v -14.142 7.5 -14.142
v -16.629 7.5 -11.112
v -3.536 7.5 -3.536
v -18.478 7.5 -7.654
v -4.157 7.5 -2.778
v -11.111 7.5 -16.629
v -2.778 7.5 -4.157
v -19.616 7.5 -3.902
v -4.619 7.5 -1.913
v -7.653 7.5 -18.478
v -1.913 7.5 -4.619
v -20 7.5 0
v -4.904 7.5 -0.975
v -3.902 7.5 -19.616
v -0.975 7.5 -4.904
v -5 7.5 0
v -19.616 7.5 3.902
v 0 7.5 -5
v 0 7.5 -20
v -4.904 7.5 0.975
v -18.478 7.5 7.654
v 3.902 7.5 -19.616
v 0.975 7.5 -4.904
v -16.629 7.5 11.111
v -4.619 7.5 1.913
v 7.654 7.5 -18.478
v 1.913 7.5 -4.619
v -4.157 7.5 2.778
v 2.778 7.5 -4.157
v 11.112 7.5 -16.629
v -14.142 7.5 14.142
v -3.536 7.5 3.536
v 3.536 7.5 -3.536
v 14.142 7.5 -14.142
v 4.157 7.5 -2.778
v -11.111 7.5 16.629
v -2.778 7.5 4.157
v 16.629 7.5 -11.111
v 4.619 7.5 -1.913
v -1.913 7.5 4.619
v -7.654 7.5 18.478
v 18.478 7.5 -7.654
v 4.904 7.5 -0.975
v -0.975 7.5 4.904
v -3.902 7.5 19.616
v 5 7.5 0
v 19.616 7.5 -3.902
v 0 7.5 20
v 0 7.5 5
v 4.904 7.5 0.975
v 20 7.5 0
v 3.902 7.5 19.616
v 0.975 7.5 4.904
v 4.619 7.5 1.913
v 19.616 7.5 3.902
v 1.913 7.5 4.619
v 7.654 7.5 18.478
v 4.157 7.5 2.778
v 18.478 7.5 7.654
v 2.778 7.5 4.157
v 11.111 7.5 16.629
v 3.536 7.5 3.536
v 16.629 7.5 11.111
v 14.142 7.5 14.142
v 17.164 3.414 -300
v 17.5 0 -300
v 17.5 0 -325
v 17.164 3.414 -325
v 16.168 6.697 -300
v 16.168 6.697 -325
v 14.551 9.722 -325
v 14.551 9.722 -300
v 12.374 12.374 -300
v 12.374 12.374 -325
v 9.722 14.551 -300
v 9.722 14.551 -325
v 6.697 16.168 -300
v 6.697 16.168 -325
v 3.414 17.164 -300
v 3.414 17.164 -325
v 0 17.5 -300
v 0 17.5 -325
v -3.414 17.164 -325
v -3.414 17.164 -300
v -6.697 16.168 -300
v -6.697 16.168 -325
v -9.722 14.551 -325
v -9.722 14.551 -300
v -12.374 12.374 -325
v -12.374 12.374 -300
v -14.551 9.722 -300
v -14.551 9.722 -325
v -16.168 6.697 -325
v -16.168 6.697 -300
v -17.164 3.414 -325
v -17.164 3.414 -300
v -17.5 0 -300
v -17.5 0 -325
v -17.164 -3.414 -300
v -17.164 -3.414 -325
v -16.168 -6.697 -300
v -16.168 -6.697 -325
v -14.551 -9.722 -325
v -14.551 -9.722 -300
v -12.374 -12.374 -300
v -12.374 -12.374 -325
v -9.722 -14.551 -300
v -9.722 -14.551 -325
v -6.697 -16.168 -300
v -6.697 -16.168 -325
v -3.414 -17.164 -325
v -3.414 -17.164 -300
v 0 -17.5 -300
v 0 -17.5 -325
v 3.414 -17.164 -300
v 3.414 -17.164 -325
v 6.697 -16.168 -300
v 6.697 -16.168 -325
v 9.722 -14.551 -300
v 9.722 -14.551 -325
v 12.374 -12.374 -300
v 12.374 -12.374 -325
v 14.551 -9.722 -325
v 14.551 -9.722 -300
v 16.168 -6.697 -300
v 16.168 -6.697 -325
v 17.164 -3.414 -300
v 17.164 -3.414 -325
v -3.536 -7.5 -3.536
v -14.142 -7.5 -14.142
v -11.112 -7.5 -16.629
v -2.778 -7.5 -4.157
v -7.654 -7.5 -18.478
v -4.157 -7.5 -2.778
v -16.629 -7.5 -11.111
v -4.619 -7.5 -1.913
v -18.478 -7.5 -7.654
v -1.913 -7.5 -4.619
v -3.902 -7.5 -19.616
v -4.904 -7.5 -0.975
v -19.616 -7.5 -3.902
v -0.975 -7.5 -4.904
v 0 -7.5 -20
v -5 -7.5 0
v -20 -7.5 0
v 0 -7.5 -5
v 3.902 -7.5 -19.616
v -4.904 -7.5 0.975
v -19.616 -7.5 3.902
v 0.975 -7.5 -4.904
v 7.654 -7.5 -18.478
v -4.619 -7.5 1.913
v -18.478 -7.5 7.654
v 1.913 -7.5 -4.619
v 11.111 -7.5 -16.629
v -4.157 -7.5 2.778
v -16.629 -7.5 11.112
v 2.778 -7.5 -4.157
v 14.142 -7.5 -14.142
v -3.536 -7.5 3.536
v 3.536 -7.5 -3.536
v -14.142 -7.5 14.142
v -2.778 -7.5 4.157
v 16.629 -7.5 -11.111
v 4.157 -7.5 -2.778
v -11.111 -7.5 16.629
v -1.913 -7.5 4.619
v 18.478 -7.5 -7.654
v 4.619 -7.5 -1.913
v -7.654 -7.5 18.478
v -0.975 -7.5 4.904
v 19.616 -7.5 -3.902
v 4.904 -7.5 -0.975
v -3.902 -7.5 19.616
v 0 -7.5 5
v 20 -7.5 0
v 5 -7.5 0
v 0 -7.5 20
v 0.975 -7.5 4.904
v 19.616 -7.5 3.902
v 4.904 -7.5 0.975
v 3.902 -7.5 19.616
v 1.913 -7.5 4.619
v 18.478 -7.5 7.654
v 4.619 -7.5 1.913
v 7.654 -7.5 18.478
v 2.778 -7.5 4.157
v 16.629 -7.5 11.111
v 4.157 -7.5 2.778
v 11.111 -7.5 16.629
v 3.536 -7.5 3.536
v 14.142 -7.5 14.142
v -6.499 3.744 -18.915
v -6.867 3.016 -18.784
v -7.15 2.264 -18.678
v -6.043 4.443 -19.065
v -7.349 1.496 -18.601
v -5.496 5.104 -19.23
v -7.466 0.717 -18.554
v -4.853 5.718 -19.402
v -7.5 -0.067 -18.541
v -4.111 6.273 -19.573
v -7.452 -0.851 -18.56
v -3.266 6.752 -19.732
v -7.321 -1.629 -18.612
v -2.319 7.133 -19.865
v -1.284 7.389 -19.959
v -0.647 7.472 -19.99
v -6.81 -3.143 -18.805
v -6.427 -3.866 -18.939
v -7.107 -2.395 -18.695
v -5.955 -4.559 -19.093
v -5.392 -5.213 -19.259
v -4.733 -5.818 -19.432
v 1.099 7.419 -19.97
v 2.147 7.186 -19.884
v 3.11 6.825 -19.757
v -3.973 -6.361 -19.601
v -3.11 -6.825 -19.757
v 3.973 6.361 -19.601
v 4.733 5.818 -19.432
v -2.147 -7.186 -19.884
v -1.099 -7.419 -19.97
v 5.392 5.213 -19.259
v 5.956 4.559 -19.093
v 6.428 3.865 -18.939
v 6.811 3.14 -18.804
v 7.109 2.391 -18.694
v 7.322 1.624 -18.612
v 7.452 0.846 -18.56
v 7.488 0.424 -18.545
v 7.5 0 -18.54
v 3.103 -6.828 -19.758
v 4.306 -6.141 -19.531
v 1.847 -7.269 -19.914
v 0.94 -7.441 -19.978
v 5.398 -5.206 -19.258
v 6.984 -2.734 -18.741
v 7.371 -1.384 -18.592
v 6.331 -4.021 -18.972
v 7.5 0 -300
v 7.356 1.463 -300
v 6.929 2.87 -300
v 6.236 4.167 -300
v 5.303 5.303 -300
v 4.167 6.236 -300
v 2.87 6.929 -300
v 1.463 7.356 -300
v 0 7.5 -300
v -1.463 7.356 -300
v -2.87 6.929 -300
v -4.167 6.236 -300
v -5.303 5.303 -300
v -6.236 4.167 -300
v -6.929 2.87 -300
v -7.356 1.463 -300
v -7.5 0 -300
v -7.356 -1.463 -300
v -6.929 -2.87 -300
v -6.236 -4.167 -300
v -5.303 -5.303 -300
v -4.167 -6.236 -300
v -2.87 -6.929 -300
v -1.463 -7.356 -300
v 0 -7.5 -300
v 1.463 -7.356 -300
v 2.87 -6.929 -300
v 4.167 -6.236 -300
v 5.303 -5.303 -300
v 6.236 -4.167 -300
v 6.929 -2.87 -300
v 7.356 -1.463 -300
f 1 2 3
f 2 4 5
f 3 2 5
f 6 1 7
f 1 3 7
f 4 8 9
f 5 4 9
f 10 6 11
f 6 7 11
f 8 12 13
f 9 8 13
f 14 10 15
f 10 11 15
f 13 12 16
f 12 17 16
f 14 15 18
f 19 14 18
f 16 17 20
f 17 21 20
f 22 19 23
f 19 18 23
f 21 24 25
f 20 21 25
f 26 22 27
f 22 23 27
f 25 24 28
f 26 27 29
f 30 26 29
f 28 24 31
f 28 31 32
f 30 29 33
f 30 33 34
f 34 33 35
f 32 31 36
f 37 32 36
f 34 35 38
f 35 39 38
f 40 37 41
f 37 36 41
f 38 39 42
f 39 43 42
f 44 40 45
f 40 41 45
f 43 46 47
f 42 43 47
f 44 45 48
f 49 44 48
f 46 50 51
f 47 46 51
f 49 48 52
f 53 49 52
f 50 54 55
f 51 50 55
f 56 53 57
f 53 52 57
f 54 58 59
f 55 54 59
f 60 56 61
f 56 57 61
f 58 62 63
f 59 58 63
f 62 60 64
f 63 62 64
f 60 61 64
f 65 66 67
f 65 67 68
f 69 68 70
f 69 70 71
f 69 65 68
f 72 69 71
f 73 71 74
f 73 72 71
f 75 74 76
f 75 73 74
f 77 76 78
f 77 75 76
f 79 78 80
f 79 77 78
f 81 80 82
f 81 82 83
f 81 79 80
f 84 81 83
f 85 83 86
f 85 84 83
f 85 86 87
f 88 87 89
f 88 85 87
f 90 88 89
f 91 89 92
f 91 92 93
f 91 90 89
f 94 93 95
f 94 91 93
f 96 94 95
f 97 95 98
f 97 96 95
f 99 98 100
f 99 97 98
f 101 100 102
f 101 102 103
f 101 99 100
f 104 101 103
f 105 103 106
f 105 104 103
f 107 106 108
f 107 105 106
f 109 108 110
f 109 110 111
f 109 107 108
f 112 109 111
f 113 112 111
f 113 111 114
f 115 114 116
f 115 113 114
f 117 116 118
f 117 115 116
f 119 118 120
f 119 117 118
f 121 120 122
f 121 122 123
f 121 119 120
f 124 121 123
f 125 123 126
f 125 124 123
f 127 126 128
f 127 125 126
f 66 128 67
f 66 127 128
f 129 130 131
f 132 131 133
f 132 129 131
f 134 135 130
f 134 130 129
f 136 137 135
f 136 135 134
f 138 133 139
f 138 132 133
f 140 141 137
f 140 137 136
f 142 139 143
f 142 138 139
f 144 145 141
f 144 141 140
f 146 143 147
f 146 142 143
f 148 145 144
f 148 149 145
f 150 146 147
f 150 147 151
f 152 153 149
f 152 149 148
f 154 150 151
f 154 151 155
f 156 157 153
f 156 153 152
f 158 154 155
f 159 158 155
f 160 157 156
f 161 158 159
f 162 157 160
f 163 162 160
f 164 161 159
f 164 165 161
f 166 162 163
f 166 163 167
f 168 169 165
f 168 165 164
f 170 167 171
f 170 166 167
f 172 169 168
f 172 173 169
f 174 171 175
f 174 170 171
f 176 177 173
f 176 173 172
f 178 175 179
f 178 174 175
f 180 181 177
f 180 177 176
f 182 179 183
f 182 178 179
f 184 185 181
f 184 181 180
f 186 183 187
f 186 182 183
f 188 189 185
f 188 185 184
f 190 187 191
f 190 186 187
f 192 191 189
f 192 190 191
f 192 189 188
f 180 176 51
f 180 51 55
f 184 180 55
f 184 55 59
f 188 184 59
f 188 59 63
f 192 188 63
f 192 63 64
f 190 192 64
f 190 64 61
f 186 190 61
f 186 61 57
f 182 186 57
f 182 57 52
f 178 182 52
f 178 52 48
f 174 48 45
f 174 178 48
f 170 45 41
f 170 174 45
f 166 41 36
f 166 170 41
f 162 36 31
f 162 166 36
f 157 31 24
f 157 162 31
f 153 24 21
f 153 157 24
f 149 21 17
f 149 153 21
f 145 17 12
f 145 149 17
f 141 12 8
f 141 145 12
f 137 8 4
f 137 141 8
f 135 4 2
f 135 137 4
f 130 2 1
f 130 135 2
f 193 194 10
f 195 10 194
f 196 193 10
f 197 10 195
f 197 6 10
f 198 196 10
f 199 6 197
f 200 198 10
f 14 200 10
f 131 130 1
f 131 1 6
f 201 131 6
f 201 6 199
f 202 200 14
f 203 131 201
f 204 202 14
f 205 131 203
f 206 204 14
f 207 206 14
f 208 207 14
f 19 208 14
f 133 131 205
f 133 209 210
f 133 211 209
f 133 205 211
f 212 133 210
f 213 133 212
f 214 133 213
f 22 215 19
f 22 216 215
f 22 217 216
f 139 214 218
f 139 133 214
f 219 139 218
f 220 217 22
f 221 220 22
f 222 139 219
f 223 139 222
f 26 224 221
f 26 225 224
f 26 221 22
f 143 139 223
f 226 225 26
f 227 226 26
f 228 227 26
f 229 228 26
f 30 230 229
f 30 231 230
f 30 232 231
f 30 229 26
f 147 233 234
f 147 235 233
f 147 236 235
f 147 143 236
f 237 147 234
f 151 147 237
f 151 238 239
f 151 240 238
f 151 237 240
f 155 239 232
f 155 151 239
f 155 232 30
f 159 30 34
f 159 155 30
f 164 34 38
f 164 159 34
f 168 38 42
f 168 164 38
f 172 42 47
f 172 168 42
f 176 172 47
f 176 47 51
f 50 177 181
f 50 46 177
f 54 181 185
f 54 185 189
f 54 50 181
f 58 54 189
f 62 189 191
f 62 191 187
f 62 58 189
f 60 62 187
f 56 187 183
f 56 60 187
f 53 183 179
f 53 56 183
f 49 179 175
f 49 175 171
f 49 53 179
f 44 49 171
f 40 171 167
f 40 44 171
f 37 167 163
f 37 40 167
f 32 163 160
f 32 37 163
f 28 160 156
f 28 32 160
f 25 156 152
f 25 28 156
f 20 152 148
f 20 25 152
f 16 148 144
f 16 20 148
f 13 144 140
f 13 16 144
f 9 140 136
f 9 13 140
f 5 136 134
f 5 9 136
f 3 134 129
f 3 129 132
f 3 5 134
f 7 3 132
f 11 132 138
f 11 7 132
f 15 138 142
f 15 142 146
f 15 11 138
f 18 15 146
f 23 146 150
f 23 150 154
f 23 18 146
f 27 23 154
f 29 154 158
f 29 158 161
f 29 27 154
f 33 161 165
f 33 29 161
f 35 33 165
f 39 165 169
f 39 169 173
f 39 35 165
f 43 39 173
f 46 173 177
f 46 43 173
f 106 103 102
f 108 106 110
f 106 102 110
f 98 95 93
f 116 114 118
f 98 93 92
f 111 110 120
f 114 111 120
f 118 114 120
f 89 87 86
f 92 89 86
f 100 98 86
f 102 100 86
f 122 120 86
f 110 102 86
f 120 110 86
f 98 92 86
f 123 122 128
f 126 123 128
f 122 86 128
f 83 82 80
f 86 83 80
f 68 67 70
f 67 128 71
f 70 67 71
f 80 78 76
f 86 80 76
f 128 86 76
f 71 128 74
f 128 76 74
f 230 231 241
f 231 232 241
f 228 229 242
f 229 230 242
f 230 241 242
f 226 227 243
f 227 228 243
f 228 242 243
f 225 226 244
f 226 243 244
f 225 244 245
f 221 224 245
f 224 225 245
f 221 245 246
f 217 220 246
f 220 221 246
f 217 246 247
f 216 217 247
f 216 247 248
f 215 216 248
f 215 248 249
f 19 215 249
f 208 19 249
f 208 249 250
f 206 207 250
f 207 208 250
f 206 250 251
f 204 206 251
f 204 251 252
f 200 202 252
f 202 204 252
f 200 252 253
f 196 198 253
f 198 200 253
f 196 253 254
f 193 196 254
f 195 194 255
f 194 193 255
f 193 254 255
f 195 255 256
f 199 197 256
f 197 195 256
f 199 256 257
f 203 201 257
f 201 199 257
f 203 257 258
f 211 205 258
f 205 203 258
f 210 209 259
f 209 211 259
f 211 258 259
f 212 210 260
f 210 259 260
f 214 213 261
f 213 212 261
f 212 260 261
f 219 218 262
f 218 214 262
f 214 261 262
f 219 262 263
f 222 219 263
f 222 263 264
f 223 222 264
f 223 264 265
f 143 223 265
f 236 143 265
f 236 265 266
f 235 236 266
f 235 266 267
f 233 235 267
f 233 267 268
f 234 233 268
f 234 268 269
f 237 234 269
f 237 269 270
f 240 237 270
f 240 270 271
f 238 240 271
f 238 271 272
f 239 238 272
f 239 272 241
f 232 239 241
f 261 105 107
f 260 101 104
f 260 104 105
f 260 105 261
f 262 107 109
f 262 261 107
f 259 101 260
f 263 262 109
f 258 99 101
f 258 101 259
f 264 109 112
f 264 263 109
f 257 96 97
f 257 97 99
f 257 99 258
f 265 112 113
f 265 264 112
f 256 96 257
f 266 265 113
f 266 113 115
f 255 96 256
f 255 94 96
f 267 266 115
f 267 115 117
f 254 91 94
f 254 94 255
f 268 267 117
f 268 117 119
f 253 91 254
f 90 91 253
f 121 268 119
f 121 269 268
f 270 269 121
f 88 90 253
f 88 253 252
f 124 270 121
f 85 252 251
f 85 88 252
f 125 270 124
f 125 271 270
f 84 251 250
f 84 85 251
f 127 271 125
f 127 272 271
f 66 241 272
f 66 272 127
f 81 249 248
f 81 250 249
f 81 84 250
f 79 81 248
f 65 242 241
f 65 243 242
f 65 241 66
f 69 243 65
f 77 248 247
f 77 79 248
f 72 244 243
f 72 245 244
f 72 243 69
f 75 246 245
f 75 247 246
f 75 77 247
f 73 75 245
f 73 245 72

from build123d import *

# Parameters (mm, degrees)
F0_R     = 20
F0_R_2   = 5
F1_DEPTH = 7.5
F3_R     = 7.5
F5_R     = 17.5
F6_DEPTH = 25


with BuildPart() as f1:
    # F0 (on Front) → F1 (new body, symmetric)
    with BuildSketch(Plane.XZ):
        Circle(F0_R)
        Circle(F0_R_2, mode=Mode.SUBTRACT)
    extrude(amount=F1_DEPTH, both=True)

    # F3 (on offset) → F4 (join, up to the next surface of F1)
    with BuildSketch(Plane.XY.offset(-300)):
        Circle(F3_R)
    extrude(until=Until.NEXT)

    # F5 (on offset) → F6 (join)
    with BuildSketch(Plane.XY.offset(-300)):
        Circle(F5_R)
    extrude(amount=-F6_DEPTH)


solid = f1.part
